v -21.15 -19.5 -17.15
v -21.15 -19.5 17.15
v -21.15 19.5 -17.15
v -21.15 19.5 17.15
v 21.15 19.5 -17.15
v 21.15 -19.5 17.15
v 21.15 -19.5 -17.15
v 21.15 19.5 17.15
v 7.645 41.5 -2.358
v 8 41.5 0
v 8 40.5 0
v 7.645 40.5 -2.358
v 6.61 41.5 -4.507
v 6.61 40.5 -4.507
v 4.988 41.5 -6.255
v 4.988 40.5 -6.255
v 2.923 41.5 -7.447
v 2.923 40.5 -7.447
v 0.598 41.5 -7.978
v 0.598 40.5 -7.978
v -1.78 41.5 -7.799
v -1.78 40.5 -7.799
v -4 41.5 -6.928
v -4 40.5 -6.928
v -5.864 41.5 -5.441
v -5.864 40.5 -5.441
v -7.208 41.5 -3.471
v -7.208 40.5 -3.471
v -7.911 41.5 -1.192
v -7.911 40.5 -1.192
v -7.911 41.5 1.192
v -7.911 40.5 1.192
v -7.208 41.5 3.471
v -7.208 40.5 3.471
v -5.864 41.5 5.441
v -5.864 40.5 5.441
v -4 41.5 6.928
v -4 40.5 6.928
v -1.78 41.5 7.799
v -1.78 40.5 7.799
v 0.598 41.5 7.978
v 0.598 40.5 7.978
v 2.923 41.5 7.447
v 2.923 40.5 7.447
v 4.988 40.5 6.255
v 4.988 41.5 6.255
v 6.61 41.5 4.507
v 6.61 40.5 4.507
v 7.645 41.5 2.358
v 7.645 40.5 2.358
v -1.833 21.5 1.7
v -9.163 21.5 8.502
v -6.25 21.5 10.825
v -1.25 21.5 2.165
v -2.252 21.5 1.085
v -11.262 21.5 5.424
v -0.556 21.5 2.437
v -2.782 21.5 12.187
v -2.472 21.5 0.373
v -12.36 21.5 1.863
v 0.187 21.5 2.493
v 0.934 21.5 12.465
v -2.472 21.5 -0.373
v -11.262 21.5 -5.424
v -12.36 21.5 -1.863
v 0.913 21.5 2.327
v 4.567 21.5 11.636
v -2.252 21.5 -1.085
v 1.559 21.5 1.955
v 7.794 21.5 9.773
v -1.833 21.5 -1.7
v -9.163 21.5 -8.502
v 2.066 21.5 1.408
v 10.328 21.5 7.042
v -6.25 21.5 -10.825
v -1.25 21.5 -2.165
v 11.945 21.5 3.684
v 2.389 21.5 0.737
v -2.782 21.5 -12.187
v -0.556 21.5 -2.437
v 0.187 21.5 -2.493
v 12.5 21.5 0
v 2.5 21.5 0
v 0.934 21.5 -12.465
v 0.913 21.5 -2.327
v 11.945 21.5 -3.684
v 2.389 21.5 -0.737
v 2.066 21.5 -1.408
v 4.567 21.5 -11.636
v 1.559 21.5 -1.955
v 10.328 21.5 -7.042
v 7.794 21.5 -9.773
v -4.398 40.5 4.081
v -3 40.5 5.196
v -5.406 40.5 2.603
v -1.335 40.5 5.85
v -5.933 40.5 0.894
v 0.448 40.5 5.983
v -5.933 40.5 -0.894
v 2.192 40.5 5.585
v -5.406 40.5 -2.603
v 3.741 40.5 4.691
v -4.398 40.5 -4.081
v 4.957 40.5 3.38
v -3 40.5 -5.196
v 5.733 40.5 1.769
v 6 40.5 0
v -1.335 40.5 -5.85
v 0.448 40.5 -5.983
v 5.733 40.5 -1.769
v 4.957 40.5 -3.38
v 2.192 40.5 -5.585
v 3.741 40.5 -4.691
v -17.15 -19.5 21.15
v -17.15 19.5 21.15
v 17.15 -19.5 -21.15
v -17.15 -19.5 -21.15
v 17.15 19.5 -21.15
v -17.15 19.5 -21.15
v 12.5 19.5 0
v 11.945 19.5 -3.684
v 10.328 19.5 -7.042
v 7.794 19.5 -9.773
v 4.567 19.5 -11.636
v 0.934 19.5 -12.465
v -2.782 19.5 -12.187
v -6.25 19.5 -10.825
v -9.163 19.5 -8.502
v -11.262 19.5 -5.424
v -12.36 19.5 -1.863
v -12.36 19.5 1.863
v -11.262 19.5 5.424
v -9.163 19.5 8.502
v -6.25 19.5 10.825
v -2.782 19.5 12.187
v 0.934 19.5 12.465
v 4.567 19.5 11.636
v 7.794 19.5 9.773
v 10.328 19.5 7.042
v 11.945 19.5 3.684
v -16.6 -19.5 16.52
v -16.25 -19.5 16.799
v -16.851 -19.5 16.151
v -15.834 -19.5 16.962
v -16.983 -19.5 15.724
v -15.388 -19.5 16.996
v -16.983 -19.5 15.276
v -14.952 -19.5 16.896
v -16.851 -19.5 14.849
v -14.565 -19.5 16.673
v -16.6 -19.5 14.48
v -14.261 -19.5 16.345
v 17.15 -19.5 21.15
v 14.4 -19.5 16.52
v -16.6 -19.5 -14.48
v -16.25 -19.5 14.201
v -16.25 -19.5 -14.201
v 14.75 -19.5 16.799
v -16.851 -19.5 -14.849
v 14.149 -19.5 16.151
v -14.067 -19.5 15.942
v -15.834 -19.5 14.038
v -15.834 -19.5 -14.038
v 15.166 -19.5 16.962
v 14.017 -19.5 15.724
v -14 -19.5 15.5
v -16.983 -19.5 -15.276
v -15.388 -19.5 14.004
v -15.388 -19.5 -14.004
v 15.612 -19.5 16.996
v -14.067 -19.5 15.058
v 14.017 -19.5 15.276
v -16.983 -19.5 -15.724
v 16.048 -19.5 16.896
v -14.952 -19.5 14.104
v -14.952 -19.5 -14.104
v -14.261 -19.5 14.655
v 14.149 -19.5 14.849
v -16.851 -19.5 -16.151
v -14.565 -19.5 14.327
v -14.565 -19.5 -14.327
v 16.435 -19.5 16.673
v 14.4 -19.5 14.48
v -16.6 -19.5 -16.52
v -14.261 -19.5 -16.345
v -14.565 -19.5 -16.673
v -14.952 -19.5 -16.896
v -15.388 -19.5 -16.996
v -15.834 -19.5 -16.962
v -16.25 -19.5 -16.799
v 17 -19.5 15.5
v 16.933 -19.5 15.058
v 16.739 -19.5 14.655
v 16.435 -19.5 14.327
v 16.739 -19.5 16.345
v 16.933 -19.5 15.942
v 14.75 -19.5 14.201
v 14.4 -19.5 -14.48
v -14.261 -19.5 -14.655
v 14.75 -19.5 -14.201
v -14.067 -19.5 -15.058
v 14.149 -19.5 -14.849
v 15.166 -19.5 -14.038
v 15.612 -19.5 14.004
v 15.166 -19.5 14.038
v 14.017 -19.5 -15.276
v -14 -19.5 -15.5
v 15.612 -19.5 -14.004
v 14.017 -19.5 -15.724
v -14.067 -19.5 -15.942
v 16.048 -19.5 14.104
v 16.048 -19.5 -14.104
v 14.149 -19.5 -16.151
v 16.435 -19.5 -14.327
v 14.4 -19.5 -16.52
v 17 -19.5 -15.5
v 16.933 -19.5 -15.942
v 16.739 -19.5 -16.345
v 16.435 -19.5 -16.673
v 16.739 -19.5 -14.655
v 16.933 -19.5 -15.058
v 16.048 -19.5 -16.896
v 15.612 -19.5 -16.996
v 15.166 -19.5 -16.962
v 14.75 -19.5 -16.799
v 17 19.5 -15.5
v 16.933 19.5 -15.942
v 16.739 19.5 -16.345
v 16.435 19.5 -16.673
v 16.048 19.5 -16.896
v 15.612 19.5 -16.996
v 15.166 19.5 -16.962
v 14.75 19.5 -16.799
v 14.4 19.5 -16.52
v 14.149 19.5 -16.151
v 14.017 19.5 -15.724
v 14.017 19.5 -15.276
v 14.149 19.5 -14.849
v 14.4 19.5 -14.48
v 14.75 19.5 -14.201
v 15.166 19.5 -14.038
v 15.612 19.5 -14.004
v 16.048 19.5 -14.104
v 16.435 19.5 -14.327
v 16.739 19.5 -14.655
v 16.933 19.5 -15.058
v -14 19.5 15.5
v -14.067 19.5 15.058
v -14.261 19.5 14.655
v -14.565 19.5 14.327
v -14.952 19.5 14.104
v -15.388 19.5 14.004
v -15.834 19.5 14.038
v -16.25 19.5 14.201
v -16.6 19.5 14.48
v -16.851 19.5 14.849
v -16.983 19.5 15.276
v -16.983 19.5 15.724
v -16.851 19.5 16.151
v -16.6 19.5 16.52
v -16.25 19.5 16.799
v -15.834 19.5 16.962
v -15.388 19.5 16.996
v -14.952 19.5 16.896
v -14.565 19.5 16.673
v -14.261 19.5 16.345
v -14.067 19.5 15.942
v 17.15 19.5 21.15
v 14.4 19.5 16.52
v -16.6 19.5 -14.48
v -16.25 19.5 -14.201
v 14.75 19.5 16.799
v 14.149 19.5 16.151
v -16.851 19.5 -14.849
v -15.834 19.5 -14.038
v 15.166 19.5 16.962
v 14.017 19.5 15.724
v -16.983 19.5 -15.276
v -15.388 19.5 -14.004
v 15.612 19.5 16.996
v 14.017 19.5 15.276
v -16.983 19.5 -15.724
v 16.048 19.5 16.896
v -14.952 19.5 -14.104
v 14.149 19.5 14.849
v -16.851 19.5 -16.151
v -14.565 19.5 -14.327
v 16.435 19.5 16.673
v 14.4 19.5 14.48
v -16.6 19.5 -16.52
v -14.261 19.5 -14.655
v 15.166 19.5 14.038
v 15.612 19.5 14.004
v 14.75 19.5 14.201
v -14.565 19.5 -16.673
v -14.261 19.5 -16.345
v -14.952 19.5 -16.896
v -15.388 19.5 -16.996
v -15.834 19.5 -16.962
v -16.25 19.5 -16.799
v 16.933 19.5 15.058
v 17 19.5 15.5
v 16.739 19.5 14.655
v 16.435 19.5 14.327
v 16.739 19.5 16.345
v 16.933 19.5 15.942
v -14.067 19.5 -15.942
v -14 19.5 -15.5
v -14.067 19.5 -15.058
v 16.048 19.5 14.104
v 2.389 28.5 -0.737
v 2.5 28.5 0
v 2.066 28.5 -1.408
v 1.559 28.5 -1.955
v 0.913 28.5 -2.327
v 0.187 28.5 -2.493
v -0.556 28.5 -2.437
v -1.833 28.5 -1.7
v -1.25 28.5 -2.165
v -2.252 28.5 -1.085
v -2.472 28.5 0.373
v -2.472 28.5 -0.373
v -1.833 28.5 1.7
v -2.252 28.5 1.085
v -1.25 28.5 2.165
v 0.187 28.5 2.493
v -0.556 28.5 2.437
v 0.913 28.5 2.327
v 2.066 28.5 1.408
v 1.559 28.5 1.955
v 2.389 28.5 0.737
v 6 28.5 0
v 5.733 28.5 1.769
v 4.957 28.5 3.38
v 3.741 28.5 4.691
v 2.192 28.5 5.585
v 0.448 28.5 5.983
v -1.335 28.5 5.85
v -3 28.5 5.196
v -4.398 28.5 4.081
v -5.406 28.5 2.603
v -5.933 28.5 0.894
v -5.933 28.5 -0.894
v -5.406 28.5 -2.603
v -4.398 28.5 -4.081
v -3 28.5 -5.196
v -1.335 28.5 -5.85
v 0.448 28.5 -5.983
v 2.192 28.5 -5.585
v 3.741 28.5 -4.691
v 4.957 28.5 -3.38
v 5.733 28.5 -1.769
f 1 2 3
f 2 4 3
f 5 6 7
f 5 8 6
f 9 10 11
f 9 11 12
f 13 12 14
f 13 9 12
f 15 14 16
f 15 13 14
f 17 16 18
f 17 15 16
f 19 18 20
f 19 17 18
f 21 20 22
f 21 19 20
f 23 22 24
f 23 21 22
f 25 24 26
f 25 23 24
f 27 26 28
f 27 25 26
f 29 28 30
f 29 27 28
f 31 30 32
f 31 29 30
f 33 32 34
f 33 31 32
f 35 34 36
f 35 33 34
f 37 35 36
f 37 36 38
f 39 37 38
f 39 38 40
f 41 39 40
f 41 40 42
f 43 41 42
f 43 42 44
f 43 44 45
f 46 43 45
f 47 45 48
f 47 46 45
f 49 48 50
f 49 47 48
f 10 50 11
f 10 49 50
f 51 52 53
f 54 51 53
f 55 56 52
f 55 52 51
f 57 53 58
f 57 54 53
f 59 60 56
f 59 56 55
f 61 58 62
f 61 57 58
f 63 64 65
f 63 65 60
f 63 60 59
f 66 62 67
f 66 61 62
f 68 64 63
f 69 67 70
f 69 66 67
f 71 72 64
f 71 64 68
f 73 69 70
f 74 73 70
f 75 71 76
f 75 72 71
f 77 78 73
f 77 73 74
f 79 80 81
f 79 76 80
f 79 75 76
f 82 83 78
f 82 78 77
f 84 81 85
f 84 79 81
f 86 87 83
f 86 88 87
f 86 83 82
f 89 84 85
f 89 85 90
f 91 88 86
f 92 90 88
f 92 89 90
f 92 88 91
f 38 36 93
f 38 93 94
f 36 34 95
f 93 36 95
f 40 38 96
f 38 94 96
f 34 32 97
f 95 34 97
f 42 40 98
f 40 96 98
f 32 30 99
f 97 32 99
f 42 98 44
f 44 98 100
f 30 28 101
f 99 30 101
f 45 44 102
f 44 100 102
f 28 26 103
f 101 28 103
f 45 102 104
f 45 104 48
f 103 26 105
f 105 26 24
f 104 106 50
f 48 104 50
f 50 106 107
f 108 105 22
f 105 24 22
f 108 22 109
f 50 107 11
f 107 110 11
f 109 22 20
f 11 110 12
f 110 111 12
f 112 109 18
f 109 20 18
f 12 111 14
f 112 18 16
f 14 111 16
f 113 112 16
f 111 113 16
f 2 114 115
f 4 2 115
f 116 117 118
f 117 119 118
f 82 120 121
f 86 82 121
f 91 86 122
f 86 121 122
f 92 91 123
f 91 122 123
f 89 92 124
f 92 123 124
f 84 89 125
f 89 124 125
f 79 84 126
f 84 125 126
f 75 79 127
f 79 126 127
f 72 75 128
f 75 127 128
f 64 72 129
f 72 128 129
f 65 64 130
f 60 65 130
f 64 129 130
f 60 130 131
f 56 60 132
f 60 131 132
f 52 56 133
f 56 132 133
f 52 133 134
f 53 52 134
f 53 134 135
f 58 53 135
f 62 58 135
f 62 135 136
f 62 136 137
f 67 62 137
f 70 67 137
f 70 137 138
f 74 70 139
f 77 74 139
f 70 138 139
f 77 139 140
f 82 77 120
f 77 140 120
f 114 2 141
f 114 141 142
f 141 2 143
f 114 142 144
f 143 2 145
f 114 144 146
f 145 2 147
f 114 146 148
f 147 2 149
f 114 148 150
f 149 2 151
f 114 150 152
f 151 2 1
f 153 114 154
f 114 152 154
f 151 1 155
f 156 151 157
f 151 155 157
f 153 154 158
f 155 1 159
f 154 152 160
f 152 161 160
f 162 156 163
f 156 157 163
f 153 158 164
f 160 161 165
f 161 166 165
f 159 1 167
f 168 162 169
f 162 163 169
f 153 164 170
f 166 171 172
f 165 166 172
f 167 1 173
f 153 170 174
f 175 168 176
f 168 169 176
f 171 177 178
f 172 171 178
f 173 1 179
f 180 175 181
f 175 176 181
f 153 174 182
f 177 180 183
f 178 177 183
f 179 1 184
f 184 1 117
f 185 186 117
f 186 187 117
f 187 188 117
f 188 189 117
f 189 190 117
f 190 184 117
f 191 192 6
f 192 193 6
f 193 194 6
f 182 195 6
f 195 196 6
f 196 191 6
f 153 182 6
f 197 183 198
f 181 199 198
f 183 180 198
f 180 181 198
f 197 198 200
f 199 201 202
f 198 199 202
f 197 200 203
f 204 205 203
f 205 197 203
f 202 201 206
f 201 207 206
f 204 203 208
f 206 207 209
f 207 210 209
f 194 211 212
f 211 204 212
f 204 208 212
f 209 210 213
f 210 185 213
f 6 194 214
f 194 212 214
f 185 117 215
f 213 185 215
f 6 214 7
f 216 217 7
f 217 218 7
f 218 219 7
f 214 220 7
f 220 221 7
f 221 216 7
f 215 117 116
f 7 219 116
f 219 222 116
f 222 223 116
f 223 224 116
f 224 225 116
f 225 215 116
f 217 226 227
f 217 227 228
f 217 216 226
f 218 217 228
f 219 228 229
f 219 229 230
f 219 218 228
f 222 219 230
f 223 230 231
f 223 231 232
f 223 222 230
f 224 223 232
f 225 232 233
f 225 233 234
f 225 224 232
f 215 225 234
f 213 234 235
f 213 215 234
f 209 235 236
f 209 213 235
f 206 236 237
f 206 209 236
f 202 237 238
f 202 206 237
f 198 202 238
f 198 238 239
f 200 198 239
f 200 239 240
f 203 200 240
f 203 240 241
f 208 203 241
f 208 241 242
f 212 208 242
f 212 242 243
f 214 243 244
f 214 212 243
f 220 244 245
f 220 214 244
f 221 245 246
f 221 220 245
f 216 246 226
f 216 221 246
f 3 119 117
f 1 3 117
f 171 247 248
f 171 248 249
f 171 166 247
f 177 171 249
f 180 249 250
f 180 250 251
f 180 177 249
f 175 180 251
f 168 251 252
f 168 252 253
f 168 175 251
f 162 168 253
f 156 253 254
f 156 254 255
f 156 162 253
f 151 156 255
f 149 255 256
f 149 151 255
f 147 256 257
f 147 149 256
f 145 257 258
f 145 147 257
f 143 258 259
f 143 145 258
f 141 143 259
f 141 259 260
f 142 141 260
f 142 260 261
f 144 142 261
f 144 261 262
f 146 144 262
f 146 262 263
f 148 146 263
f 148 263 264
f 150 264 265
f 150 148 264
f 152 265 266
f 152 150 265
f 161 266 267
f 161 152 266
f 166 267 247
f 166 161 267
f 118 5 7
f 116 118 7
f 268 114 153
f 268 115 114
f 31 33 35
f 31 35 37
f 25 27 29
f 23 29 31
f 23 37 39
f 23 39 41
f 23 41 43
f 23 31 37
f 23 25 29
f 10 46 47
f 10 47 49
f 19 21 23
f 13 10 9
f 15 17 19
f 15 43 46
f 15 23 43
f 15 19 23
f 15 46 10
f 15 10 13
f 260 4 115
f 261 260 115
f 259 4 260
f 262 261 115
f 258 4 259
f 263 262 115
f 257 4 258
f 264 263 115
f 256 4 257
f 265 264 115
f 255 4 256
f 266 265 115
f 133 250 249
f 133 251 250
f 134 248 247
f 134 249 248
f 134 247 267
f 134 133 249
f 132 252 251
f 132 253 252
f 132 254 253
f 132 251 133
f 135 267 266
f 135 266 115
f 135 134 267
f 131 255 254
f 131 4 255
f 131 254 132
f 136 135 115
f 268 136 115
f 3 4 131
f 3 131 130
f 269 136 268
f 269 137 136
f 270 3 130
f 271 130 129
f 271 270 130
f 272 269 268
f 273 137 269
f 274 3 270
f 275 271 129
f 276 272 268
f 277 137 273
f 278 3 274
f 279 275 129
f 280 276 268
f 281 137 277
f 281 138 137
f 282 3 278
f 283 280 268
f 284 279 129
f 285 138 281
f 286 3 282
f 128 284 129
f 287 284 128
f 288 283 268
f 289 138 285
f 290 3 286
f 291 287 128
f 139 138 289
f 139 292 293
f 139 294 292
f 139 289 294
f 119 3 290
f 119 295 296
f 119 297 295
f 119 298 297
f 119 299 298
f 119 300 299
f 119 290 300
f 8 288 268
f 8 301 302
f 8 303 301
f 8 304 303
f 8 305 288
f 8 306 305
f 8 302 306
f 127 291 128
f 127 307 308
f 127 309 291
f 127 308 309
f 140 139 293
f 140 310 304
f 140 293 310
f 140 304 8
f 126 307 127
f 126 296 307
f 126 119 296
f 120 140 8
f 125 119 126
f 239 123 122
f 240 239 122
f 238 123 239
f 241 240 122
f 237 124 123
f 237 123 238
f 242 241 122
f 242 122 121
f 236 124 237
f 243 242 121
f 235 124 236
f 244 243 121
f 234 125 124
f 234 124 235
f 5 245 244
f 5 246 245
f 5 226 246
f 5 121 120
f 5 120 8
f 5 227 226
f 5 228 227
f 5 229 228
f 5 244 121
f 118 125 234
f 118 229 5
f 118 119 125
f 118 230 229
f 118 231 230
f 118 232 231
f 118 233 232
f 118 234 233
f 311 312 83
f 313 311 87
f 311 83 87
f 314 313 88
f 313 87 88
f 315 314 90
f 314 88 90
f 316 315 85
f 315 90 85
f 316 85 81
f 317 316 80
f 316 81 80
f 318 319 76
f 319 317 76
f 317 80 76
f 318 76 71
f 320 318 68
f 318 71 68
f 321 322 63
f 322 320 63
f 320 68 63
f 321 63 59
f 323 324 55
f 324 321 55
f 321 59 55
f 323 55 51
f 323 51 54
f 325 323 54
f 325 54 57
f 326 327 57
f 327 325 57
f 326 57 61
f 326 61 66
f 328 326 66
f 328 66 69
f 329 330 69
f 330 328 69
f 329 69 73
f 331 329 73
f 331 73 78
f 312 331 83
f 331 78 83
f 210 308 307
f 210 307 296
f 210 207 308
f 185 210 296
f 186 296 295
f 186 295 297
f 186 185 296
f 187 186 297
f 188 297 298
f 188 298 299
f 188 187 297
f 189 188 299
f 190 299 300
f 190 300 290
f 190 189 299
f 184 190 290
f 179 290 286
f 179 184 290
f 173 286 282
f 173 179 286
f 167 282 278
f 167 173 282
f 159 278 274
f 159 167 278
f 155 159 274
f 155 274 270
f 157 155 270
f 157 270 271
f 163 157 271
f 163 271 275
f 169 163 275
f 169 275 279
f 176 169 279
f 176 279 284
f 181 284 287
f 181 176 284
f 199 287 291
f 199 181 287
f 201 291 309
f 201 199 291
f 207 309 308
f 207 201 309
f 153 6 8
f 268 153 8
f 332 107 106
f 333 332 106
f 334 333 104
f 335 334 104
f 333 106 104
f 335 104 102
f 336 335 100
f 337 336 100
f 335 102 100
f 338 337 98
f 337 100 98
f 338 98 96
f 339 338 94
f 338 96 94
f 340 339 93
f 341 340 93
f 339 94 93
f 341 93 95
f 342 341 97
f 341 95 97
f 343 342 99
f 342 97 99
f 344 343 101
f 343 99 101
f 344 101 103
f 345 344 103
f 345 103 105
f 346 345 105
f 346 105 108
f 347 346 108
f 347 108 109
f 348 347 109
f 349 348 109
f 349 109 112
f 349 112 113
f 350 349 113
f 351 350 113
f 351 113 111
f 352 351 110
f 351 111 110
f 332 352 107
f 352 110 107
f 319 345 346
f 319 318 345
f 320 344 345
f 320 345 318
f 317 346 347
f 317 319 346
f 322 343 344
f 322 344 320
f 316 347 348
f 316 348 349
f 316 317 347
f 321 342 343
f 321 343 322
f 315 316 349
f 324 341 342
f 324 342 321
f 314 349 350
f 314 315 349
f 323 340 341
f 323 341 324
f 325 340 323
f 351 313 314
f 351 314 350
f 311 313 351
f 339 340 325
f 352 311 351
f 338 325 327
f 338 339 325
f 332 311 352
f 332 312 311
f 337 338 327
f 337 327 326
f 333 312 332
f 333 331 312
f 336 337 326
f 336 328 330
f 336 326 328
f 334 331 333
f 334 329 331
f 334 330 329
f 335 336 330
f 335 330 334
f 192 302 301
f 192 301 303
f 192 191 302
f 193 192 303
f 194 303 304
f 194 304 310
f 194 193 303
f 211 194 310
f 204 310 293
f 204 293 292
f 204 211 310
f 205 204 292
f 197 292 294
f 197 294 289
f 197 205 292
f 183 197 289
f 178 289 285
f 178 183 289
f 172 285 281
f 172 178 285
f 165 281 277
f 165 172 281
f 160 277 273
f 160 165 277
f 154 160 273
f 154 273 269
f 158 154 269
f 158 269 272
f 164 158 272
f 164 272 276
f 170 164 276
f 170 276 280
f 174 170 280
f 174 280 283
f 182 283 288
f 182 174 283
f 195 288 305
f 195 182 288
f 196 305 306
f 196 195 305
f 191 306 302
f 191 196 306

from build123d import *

# Parameters (mm, degrees)
CROQUIS1_W              = 42.3
CROQUIS1_H              = 42.3
CROQUIS1_R              = 1.5
SALIENTE_EXTRUIR1_DEPTH = 19.5
CROQUIS2_R              = 12.5
SALIENTE_EXTRUIR2_DEPTH = 2
CROQUIS3_R              = 2.5
SALIENTE_EXTRUIR3_DEPTH = 20
CROQUIS4_R              = 8
SALIENTE_EXTRUIR4_DEPTH = 1
CROQUIS5_R              = 6
SALIENTE_EXTRUIR5_DEPTH = 12
CHAFL_N1_SIZE           = 4


with BuildPart() as part:
    # Croquis1 → Saliente-Extruir1 (new body, symmetric)
    with BuildSketch(Plane(origin=(0, 0, 0), x_dir=(1, 0, 0), z_dir=(0, 1, 0))):
        Rectangle(CROQUIS1_W, CROQUIS1_H)
        with Locations((15.5, 15.5)):
            Circle(CROQUIS1_R, mode=Mode.SUBTRACT)
        with Locations((15.5, -15.5)):
            Circle(CROQUIS1_R, mode=Mode.SUBTRACT)
        with Locations((-15.5, -15.5)):
            Circle(CROQUIS1_R, mode=Mode.SUBTRACT)
        with Locations((-15.5, 15.5)):
            Circle(CROQUIS1_R, mode=Mode.SUBTRACT)
    extrude(amount=SALIENTE_EXTRUIR1_DEPTH, both=True)

    # Croquis2 → Saliente-Extruir2 (add)
    with BuildSketch(Plane(origin=(0, 19.5, 0), x_dir=(1, 0, 0), z_dir=(0, 1, 0))):
        Circle(CROQUIS2_R)
    extrude(amount=SALIENTE_EXTRUIR2_DEPTH)

    # Croquis3 → Saliente-Extruir3 (add)
    with BuildSketch(Plane(origin=(0, 21.5, 0), x_dir=(1, 0, 0), z_dir=(0, 1, 0))):
        Circle(CROQUIS3_R)
    extrude(amount=SALIENTE_EXTRUIR3_DEPTH)

    # Croquis4 → Saliente-Extruir4 (add)
    with BuildSketch(Plane(origin=(0, 41.5, 0), x_dir=(1, 0, 0), z_dir=(0, 1, 0))):
        Circle(CROQUIS4_R)
    extrude(amount=-SALIENTE_EXTRUIR4_DEPTH)

    # Croquis5 → Saliente-Extruir5 (add)
    with BuildSketch(Plane.XZ.offset(-40.5)):
        Circle(CROQUIS5_R)
    extrude(amount=SALIENTE_EXTRUIR5_DEPTH)

    # Chaflán1
    chafl_n1_edges = [part.edges().sort_by_distance(p)[0] for p in [
        (21.15, 0, 21.15),
        (-21.15, 0, 21.15),
        (-21.15, 0, -21.15),
        (21.15, 0, -21.15),
    ]]
    chamfer(chafl_n1_edges, length=CHAFL_N1_SIZE)


solid = part.part
